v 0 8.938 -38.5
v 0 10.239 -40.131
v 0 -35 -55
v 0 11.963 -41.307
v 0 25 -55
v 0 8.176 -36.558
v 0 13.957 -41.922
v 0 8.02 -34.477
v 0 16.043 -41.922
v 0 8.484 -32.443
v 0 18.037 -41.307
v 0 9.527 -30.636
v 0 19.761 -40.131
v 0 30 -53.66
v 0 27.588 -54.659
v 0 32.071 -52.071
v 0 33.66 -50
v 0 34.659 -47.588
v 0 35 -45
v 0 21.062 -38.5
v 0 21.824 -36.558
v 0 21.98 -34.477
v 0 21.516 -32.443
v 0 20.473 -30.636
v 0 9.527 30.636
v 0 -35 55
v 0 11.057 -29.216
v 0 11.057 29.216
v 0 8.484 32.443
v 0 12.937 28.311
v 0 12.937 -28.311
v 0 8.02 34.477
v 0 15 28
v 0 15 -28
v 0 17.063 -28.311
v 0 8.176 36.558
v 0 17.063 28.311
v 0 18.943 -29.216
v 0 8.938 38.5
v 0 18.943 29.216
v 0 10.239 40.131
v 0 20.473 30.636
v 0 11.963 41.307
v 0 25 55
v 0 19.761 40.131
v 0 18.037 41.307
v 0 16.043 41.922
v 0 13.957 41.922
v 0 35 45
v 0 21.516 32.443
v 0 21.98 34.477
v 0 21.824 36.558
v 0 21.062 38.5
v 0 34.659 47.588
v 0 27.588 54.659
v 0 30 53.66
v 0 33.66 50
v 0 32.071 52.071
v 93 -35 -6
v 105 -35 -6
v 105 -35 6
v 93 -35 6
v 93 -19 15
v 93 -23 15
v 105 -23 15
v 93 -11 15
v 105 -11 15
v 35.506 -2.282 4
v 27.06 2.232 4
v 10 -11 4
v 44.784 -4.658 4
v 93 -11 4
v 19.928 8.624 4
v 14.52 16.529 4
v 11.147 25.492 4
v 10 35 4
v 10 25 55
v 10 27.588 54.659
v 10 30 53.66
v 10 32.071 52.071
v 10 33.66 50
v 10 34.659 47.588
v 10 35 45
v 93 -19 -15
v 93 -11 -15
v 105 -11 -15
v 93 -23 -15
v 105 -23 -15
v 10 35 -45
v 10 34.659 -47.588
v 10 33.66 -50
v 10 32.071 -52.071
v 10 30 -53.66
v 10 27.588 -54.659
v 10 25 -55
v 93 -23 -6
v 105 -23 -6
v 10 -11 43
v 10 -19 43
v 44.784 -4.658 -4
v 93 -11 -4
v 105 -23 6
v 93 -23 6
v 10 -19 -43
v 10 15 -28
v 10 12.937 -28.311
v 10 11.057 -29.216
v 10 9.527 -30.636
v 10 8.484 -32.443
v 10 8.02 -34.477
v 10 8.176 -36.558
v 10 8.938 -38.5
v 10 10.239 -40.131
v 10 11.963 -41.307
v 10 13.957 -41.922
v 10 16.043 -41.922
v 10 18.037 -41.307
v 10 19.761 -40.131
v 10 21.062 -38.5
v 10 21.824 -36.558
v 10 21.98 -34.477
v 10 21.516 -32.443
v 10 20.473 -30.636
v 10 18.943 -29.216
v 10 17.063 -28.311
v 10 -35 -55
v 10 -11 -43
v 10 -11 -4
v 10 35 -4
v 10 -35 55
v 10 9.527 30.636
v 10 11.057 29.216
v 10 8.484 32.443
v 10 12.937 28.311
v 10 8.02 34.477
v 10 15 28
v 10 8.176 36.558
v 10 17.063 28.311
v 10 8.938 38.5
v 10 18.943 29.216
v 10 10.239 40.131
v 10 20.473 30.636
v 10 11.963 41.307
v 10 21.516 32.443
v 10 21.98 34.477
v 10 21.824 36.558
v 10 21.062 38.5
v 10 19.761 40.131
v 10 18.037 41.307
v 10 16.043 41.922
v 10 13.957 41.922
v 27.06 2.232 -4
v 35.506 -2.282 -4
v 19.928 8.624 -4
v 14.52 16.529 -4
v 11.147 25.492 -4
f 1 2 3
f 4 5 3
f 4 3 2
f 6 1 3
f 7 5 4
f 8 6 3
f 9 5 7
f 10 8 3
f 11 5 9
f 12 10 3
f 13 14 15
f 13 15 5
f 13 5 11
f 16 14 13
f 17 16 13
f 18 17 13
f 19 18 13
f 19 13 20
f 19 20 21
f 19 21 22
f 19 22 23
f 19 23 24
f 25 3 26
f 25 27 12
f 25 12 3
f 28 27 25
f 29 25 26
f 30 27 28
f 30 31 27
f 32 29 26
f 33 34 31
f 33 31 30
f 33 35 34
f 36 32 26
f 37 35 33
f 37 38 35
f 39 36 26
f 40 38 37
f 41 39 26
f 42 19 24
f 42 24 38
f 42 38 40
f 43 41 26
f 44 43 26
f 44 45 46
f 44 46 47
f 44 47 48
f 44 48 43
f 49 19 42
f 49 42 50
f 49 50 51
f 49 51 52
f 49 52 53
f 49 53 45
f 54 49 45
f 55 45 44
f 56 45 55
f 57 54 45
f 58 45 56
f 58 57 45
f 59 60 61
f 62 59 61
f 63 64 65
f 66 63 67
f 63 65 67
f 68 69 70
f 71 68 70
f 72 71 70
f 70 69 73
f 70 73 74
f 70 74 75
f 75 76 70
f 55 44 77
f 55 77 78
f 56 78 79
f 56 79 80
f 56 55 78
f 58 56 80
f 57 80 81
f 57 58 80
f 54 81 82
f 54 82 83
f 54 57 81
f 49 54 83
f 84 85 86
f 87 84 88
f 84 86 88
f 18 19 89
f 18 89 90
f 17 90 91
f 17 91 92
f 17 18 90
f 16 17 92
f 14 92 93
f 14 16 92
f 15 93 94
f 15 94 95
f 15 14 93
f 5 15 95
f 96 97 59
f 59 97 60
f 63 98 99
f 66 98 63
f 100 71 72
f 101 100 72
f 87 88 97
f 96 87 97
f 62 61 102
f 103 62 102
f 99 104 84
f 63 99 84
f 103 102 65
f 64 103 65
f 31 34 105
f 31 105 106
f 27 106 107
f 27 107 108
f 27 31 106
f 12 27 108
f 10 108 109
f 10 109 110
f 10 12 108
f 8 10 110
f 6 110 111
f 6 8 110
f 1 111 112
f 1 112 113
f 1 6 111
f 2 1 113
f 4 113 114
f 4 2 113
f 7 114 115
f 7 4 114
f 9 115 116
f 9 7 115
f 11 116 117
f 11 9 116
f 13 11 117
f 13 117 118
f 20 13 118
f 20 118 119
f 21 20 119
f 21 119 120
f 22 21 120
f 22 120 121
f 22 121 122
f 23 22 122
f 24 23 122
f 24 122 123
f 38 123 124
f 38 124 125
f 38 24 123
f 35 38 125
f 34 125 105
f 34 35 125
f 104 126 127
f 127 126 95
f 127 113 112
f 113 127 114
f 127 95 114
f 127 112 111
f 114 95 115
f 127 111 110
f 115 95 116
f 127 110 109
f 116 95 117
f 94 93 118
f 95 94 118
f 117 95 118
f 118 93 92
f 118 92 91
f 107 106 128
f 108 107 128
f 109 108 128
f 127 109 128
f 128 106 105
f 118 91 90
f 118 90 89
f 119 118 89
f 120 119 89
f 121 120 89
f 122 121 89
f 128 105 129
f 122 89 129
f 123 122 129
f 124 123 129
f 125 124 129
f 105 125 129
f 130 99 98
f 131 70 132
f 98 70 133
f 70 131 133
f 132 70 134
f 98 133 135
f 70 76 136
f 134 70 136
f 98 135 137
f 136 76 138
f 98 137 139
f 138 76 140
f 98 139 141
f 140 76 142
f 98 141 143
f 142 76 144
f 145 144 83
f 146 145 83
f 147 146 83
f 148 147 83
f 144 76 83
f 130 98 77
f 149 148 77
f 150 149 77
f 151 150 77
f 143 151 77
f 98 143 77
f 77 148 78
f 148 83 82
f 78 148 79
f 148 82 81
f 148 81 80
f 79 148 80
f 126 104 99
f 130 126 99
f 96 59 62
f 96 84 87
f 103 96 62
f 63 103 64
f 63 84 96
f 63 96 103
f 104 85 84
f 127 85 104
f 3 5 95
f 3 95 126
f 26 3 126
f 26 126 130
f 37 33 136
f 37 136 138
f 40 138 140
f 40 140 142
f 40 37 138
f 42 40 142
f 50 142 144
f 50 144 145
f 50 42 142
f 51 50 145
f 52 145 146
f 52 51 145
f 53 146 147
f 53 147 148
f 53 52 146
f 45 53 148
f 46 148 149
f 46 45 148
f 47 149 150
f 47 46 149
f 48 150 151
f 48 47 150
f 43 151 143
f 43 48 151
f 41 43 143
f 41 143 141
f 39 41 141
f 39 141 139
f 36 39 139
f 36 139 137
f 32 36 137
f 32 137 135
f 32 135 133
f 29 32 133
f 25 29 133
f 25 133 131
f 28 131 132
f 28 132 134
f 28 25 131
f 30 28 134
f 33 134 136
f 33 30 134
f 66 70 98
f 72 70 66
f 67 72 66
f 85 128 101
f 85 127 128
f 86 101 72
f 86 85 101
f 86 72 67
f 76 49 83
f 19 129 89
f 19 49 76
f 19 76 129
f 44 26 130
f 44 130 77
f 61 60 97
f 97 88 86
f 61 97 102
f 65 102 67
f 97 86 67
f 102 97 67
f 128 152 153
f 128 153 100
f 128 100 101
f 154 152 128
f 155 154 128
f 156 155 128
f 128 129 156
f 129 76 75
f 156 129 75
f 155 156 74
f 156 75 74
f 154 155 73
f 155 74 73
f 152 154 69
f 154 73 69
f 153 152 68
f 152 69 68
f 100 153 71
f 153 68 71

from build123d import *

# Parameters (mm, degrees)
SKETCH1_R           = 7
BOSS_EXTRUDE1_DEPTH = 10
BOSS_EXTRUDE2_DEPTH = 12
BOSS_EXTRUDE3_DEPTH = 4
BOSS_EXTRUDE4_START = -15
BOSS_EXTRUDE4_DEPTH = 4


with BuildPart() as part:
    # Sketch1 → Boss-Extrude1 (new body)
    with BuildSketch(Plane(origin=(0, 0, 0), x_dir=(0, 0, -1), z_dir=(1, 0, 0))):
        with BuildLine():
            Line((-45, 35), (45, 35))
            ThreePointArc((45, 35), (52.071067812, 32.071067812), (55, 25))
            Line((55, 25), (55, -35))
            Line((55, -35), (-55, -35))
            Line((-55, -35), (-55, 25))
            ThreePointArc((-55, 25), (-52.071067812, 32.071067812), (-45, 35))
        make_face()
        with Locations((-35, 15)):
            Circle(SKETCH1_R, mode=Mode.SUBTRACT)
        with Locations(Location((35, 15, 0), (0, 0, 180))):
            Circle(SKETCH1_R, mode=Mode.SUBTRACT)
    extrude(amount=BOSS_EXTRUDE1_DEPTH)



with BuildPart() as body_2:
    # Sketch4 → Boss-Extrude2 (new body)
    with BuildSketch(Plane.ZY.offset(-105)):
        Polygon((6, -35), (6, -23), (15, -23), (15, -11), (-15, -11), (-15, -23), (-6, -23), (-6, -35), align=None)
    extrude(amount=BOSS_EXTRUDE2_DEPTH)


with BuildPart() as part_1:
    add(part.part)

    add(body_2.part)  # Boss-Extrude3 merges body 2
    # Sketch5 → Boss-Extrude3 (add, symmetric)
    with BuildSketch(Plane.XY):
        with BuildLine():
            Line((44.783977599, -4.658455723), (93, -11))
            Line((93, -11), (93, -15))
            Line((93, -15), (10, -15))
            Line((10, -15), (10, 35))
            ThreePointArc((10, 35), (19.928078744, 8.624262058), (44.783977599, -4.658455723))
        make_face()
    extrude(amount=BOSS_EXTRUDE3_DEPTH, both=True)

    # Sketch6 → Boss-Extrude4 (add, symmetric)
    with BuildSketch(Plane(origin=(0, 0, 0), x_dir=(1, 0, 0), z_dir=(0, 1, 0)).offset(BOSS_EXTRUDE4_START)):
        Polygon((93, -15), (93, -4), (93, 4), (93, 15), (10, 43), (10, -43), align=None)
    extrude(amount=BOSS_EXTRUDE4_DEPTH, both=True)


solid = part_1.part
